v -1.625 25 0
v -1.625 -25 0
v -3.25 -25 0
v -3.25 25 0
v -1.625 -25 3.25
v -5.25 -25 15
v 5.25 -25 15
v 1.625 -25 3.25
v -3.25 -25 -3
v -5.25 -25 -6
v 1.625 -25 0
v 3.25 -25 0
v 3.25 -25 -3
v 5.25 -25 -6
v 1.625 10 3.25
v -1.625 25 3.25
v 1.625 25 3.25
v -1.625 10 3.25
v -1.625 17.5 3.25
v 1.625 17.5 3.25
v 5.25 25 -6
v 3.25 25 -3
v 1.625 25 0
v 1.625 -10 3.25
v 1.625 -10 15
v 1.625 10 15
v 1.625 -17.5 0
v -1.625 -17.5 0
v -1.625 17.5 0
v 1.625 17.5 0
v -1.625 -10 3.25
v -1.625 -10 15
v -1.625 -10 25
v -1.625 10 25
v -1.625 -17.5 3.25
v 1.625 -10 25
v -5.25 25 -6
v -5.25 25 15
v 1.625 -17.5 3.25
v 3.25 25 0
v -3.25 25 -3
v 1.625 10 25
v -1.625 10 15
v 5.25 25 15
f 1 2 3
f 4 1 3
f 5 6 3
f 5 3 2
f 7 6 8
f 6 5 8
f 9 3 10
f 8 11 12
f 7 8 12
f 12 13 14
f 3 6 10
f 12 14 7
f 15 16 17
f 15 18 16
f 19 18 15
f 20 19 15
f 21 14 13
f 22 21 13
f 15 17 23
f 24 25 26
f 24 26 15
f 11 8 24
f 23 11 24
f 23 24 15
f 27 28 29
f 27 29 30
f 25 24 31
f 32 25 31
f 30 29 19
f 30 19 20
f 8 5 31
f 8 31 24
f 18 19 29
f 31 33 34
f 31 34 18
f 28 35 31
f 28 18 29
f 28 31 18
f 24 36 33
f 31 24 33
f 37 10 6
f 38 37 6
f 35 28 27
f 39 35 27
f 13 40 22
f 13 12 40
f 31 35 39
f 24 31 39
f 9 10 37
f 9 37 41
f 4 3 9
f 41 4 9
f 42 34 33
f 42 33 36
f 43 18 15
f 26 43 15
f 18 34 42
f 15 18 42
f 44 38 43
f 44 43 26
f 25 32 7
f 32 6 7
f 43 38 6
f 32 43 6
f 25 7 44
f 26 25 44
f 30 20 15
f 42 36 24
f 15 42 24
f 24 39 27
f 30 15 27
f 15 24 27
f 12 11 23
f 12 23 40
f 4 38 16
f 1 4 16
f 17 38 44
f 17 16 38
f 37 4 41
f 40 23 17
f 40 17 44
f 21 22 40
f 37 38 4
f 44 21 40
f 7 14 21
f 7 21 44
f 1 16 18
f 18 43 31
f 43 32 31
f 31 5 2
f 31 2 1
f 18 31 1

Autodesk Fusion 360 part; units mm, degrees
sketch "Sketch1" plane through (0, 0, 0) normal (0, 1, 0) x (1, 0, 0) in component "Servo Actuator"
  line L0 (0, 0) -> (3.25, 0)
  line L1 (3.25, 0) -> (3.25, 3)
  line L2 (3.25, 0) -> (5.25, 0)
  line L3 (5.25, 0) -> (5.25, 6)
  line L4 (5.25, 6) -> (3.25, 3)
  line L5 (0, 0) -> (0, -3.25)
  line L6 (0, -3.25) -> (1.625, -3.25)
  line L7 (1.625, -3.25) -> (1.625, 0)
  line L8 (5.25, 0) -> (5.25, -3.25)
  line L9 (5.25, -3.25) -> (1.625, -3.25)
  line L10 (0, -3.25) -> (0, -5.75)
  line L11 (5.25, -3.25) -> (5.25, -5.75)
  line L12 (5.25, -5.75) -> (0, -5.75)
  line L13 (0, -5.75) -> (0, -35)
  line L14 (0, -35) -> (5.25, -35)
  line L15 (5.25, -35) -> (5.25, -5.75)
  line L16 (-5.25, 0) -> (-5.25, -3.25)
  line L17 (0, 0) -> (-3.25, 0)
  line L18 (-5.25, -5.75) -> (0, -5.75)
  line L19 (-5.25, -35) -> (-5.25, -5.75)
  line L20 (-5.25, -3.25) -> (-5.25, -5.75)
  line L21 (-1.625, -3.25) -> (-1.625, 0)
  line L22 (-5.25, 6) -> (-3.25, 3)
  line L23 (-5.25, 0) -> (-5.25, 6)
  line L24 (-3.25, 0) -> (-5.25, 0)
  line L25 (0, -35) -> (-5.25, -35)
  line L26 (0, -3.25) -> (-1.625, -3.25)
  line L27 (-3.25, 0) -> (-3.25, 3)
  line L28 (-5.25, -3.25) -> (-1.625, -3.25)
  dimension "d1" = 3.25
  dimension "d2" = 3
  dimension "d6" = 2
  dimension "d7" = 6
  dimension "d8" = 3.25
  dimension "d9" = 1.625
  dimension "d10" = 3.25
  dimension "d12" = 2.5
  dimension "d13" = 2.5
  dimension "d14" = 29.25
  dimension "d15" = 5.25
extrude "Extrude1" add sketch "Sketch1" along normal mid plane 50 contours L0 L2 L7 L8 L9 | L6 L9 L10 L11 L12 | L10 L18 L20 L26 L28 | L16 L17 L21 L24 L28 | L1 L2 L3 L4 | L12 L13 L14 L15 | L13 L18 L19 L25 | L22 L23 L24 L27 makes body 1 in component "Servo Actuator"
extrude "Extrude2" cut 1 faces at (-1.75, -8.3333, 35) along direction (0, 0, -1) blind 20 on bodies 1 bodies 1 in component "Servo Actuator"
extrude "Extrude3" add sketch "Sketch1" along normal mid plane 35 separate body contours L0 L5 L6 L7 | L5 L17 L21 L26 makes body 2 in component "Servo Actuator"
sketch "Sketch2" plane through (0, 0, 0) normal (0, 0, 1) x (1, 0, 0) in component "Servo Actuator"
  line L0 (1.625, -10) -> (-1.625, -10)
  line L1 (-1.625, -10) -> (-1.625, 10)
  line L2 (-1.625, 10) -> (1.625, 10)
  line L3 (1.625, 10) -> (1.625, -10)
  line L4 (1.625, -10) -> (-1.625, 10) construction
  line L5 (-1.625, -10) -> (1.625, 10) construction
  dimension "d30" = 3.25
  dimension "d31" = 20
extrude "Extrude4" add sketch "Sketch2" along normal blind 25 bodies 2 in component "Servo Actuator"
extrude "Extrude5" cut sketch "Sketch2" along normal blind 15 bodies 1 in component "Servo Actuator"
component "Servo Actuator" placed x (1, 0, 0) y (0, 1, 0) z (0, 0, 1) at (0, 0, 0)
equation "d9 = ( 3.25 / 2 ) * 1 mm"
equation "d25 = ( 35 / 2 ) * 1 mm"
